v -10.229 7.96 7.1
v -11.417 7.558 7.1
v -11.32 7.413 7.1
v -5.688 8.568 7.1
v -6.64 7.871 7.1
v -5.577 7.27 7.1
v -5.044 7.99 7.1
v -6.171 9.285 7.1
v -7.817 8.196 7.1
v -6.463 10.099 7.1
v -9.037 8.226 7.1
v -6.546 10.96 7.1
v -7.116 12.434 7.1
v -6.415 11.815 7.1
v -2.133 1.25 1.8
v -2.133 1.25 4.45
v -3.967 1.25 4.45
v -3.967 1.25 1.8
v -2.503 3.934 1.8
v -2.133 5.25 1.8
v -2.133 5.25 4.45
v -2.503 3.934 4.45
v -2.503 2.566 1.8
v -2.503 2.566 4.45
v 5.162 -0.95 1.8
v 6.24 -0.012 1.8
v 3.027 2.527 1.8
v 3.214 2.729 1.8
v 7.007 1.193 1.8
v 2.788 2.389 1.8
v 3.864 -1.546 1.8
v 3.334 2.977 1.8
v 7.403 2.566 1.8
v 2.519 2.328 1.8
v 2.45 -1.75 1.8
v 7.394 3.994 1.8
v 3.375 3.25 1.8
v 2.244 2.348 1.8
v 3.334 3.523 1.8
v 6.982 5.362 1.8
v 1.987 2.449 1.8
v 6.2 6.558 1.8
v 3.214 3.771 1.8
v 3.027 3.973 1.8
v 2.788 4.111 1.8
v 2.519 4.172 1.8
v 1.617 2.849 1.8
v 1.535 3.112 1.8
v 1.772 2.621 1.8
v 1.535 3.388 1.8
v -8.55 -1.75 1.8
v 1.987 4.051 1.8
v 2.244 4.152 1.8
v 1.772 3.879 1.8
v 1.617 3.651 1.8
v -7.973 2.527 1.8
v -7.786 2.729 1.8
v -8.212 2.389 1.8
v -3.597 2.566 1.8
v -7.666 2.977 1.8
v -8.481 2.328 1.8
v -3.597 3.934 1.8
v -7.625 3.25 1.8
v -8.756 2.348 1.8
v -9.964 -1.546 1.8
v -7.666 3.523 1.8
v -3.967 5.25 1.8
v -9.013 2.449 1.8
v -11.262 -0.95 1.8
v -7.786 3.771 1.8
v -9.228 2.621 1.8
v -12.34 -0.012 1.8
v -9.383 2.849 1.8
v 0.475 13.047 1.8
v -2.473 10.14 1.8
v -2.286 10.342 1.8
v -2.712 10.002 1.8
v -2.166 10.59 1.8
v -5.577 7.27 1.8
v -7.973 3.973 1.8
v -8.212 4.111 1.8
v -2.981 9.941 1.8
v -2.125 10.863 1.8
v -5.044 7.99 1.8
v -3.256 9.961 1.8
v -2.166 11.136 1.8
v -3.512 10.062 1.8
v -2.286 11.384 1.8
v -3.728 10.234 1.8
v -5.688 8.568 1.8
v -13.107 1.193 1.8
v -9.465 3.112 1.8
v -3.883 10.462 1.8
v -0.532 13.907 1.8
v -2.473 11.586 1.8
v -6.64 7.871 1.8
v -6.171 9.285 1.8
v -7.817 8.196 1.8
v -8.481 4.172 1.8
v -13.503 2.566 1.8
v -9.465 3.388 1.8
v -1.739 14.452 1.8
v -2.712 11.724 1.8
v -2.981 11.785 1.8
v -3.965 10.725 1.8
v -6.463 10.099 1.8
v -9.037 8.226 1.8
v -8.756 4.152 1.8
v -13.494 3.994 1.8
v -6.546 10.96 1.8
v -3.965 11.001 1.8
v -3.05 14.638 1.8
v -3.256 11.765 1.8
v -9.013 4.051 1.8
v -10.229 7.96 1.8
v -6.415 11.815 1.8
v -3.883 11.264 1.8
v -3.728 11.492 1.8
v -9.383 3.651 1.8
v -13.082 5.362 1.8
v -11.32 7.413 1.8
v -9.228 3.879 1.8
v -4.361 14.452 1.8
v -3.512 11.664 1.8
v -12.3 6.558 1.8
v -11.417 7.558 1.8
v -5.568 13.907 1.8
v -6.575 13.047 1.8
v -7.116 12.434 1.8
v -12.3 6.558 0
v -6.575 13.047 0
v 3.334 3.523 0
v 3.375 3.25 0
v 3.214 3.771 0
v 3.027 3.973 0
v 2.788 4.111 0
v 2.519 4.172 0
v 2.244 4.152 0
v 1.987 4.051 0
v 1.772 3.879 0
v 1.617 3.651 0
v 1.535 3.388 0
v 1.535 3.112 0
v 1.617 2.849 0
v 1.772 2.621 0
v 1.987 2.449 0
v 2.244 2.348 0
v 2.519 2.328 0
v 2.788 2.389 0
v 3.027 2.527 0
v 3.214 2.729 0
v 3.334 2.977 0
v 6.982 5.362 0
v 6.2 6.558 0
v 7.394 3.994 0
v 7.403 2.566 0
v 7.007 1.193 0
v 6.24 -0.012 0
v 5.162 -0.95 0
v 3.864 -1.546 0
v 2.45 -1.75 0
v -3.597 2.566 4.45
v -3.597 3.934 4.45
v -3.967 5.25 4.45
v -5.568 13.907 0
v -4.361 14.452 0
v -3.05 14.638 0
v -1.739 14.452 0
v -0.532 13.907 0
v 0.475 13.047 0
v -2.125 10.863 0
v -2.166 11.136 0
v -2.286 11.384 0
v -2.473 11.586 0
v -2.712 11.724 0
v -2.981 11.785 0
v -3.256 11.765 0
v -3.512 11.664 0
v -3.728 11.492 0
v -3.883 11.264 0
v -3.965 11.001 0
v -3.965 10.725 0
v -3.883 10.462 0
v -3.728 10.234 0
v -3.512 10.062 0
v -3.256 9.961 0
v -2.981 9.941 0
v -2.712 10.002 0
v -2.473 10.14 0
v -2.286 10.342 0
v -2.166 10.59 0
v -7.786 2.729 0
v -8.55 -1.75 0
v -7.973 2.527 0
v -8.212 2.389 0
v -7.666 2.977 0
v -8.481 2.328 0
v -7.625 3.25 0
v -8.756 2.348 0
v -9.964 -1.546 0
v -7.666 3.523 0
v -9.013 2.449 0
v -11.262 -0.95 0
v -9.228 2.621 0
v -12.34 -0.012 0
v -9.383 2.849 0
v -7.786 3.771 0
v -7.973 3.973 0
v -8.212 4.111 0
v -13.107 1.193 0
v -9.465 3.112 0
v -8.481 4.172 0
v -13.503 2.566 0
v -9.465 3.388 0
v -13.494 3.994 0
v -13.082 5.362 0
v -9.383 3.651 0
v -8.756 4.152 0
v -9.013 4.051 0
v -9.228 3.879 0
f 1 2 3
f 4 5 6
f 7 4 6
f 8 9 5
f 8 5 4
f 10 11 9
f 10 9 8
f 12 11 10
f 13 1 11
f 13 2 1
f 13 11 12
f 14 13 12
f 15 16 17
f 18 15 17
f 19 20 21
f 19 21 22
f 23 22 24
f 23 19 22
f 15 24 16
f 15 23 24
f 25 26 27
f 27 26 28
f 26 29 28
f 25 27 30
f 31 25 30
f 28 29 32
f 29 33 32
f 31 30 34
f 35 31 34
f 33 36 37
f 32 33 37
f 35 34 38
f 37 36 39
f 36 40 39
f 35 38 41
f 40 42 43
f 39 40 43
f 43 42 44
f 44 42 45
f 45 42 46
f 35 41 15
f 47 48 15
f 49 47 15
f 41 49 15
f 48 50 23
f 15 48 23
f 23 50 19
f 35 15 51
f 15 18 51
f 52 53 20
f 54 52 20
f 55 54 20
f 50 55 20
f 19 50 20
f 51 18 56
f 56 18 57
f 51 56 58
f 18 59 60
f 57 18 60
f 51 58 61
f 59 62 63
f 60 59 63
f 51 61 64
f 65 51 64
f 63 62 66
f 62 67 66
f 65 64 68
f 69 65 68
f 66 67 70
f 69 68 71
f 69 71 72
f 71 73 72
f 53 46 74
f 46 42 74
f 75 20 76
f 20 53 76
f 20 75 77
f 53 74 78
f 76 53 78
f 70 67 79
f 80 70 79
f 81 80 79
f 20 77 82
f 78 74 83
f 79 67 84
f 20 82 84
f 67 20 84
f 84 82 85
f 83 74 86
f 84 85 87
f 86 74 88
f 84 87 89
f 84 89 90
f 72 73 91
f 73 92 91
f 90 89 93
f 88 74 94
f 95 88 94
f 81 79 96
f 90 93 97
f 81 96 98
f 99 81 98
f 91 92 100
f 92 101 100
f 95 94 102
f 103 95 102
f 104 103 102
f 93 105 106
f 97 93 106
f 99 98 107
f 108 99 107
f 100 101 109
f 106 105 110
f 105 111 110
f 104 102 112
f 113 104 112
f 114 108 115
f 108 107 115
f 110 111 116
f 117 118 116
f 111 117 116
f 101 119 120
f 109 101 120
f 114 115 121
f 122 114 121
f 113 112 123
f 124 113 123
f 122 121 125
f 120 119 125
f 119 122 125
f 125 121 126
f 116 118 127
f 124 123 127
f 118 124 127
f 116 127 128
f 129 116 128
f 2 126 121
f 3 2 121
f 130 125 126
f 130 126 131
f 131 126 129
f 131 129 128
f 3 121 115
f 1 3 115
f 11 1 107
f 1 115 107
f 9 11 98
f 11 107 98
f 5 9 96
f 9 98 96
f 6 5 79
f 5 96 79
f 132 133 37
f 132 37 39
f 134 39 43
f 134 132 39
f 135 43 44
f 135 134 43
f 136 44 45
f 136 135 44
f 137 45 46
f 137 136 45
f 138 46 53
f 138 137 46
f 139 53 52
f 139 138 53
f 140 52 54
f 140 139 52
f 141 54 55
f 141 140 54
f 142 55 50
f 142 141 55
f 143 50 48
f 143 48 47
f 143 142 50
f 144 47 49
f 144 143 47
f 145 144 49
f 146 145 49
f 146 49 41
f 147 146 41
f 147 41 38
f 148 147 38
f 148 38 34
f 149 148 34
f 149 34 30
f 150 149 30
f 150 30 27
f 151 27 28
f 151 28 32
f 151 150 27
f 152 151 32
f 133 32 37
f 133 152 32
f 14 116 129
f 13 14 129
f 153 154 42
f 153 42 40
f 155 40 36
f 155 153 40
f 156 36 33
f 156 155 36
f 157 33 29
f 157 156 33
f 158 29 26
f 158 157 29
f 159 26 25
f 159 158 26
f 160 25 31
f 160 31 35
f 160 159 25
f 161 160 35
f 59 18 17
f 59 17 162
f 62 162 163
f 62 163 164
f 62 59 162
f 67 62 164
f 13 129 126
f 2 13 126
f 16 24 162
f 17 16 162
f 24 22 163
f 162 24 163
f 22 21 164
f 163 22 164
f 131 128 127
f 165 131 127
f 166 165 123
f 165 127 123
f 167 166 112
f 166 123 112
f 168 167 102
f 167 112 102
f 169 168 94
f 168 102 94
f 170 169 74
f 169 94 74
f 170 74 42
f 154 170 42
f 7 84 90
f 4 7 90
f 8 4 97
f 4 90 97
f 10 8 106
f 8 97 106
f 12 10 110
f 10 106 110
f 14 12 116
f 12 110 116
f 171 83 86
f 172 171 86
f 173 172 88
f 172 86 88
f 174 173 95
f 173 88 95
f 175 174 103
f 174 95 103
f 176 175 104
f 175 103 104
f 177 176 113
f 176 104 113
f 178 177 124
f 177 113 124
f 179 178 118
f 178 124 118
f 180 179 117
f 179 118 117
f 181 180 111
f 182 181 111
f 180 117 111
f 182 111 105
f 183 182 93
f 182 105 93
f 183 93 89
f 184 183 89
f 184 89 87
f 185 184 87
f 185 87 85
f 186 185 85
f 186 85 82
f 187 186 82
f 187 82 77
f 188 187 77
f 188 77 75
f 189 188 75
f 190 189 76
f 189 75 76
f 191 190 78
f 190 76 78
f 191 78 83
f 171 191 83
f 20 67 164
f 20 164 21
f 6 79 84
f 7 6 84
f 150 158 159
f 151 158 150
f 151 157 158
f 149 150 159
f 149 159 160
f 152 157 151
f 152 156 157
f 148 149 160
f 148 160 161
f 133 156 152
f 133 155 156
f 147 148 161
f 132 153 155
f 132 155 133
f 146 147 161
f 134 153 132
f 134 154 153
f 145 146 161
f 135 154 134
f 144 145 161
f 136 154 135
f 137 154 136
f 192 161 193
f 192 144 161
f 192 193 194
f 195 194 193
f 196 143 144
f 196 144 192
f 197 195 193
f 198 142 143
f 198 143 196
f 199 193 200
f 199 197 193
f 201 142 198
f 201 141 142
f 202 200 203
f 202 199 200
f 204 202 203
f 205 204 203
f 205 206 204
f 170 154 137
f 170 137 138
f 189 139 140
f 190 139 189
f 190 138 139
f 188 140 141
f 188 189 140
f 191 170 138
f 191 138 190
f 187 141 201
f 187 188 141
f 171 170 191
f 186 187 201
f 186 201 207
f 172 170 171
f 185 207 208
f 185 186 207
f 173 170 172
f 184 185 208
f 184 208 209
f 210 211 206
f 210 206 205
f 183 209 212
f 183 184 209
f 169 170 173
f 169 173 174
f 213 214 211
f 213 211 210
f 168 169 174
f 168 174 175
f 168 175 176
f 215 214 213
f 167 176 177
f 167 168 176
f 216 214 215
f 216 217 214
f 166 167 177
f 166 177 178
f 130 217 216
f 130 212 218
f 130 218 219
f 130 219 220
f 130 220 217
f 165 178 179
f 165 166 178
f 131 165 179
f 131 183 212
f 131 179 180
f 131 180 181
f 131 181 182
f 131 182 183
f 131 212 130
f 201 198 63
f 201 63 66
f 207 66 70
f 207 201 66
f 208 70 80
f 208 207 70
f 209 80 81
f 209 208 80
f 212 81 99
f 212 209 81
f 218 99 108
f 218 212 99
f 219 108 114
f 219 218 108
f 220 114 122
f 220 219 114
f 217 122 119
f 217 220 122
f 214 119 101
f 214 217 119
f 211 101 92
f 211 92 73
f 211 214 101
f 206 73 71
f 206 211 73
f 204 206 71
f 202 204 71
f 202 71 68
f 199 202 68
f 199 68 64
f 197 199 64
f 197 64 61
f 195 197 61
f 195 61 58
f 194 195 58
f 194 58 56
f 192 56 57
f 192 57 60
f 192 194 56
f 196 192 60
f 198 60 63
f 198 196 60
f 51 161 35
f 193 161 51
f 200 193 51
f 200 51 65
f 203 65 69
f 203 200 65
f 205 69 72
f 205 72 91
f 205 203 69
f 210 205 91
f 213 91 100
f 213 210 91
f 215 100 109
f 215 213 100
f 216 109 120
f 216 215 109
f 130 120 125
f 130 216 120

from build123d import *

# Parameters (mm, degrees)
SKETCH_1_R      = 0.925
EXTRUDE_1_DEPTH = 1.8
EXTRUDE_START   = -1.8
SKETCH_2_R      = 0.925
EXTRUDE_2_DEPTH = 1.8
EXTRUDE_3_DEPTH = 5.3
EXTRUDE_4_DEPTH = 2.65


with BuildPart() as part:
    # 草图1 → 凸台-拉伸1 (new body)
    with BuildSketch(Plane.XY):
        with BuildLine():
            Line((-8.55, 8.25), (2.45, 8.25))
            ThreePointArc((2.45, 8.25), (7.45, 3.25), (2.45, -1.75))
            Line((2.45, -1.75), (-8.55, -1.75))
            ThreePointArc((-8.55, -1.75), (-13.55, 3.25), (-8.55, 8.25))
        make_face()
        with Locations((-8.55, 3.25)):
            Circle(SKETCH_1_R, mode=Mode.SUBTRACT)
        with Locations((2.45, 3.25)):
            Circle(SKETCH_1_R, mode=Mode.SUBTRACT)
    extrude(amount=EXTRUDE_1_DEPTH)

    # 草图2 → 凸台-拉伸2 (add)
    with BuildSketch(Plane.XY.offset(1.8).offset(EXTRUDE_START)):
        with BuildLine():
            Line((-12.299646462, 6.55758997), (-6.57492094, 13.047420027))
            ThreePointArc((-6.57492094, 13.047420027), (-3.05, 14.638399767), (0.47492094, 13.047420027))
            Line((0.47492094, 13.047420027), (6.199646462, 6.55758997))
            ThreePointArc((6.199646462, 6.55758997), (4.506945569, 7.807299082), (2.45, 8.25))
            Line((2.45, 8.25), (-8.55, 8.25))
            ThreePointArc((-8.55, 8.25), (-10.606945569, 7.807299082), (-12.299646462, 6.55758997))
        make_face()
        with Locations((-3.05, 10.863062049)):
            Circle(SKETCH_2_R, mode=Mode.SUBTRACT)
    extrude(amount=EXTRUDE_2_DEPTH)

    # 草图3 → 凸台-拉伸3 (add)
    with BuildSketch(Plane.XY.offset(1.8)):
        with BuildLine():
            Line((-7.116209234, 12.433789028), (-11.416941699, 7.558267449))
            Line((-11.416941699, 7.558267449), (-11.319997249, 7.412585163))
            ThreePointArc((-11.319997249, 7.412585163), (-8.425967454, 8.248461356), (-5.576956996, 7.270076529))
            Line((-5.576956996, 7.270076529), (-5.044384077, 7.990208692))
            ThreePointArc((-5.044384077, 7.990208692), (-6.342261306, 9.683286753), (-6.415115625, 11.815349339))
            Line((-6.415115625, 11.815349339), (-7.116209234, 12.433789028))
        make_face()
    extrude(amount=EXTRUDE_3_DEPTH)

    # 草图3<3> → 凸台-拉伸4 (add)
    with BuildSketch(Plane.XY.offset(1.8)):
        with BuildLine():
            Line((-2.132575695, 5.25), (-3.967424305, 5.25))
            ThreePointArc((-3.967424305, 5.25), (-3.55, 3.25), (-3.967424305, 1.25))
            Line((-3.967424305, 1.25), (-2.132575695, 1.25))
            ThreePointArc((-2.132575695, 1.25), (-2.55, 3.25), (-2.132575695, 5.25))
        make_face()
    extrude(amount=EXTRUDE_4_DEPTH)


solid = part.part
